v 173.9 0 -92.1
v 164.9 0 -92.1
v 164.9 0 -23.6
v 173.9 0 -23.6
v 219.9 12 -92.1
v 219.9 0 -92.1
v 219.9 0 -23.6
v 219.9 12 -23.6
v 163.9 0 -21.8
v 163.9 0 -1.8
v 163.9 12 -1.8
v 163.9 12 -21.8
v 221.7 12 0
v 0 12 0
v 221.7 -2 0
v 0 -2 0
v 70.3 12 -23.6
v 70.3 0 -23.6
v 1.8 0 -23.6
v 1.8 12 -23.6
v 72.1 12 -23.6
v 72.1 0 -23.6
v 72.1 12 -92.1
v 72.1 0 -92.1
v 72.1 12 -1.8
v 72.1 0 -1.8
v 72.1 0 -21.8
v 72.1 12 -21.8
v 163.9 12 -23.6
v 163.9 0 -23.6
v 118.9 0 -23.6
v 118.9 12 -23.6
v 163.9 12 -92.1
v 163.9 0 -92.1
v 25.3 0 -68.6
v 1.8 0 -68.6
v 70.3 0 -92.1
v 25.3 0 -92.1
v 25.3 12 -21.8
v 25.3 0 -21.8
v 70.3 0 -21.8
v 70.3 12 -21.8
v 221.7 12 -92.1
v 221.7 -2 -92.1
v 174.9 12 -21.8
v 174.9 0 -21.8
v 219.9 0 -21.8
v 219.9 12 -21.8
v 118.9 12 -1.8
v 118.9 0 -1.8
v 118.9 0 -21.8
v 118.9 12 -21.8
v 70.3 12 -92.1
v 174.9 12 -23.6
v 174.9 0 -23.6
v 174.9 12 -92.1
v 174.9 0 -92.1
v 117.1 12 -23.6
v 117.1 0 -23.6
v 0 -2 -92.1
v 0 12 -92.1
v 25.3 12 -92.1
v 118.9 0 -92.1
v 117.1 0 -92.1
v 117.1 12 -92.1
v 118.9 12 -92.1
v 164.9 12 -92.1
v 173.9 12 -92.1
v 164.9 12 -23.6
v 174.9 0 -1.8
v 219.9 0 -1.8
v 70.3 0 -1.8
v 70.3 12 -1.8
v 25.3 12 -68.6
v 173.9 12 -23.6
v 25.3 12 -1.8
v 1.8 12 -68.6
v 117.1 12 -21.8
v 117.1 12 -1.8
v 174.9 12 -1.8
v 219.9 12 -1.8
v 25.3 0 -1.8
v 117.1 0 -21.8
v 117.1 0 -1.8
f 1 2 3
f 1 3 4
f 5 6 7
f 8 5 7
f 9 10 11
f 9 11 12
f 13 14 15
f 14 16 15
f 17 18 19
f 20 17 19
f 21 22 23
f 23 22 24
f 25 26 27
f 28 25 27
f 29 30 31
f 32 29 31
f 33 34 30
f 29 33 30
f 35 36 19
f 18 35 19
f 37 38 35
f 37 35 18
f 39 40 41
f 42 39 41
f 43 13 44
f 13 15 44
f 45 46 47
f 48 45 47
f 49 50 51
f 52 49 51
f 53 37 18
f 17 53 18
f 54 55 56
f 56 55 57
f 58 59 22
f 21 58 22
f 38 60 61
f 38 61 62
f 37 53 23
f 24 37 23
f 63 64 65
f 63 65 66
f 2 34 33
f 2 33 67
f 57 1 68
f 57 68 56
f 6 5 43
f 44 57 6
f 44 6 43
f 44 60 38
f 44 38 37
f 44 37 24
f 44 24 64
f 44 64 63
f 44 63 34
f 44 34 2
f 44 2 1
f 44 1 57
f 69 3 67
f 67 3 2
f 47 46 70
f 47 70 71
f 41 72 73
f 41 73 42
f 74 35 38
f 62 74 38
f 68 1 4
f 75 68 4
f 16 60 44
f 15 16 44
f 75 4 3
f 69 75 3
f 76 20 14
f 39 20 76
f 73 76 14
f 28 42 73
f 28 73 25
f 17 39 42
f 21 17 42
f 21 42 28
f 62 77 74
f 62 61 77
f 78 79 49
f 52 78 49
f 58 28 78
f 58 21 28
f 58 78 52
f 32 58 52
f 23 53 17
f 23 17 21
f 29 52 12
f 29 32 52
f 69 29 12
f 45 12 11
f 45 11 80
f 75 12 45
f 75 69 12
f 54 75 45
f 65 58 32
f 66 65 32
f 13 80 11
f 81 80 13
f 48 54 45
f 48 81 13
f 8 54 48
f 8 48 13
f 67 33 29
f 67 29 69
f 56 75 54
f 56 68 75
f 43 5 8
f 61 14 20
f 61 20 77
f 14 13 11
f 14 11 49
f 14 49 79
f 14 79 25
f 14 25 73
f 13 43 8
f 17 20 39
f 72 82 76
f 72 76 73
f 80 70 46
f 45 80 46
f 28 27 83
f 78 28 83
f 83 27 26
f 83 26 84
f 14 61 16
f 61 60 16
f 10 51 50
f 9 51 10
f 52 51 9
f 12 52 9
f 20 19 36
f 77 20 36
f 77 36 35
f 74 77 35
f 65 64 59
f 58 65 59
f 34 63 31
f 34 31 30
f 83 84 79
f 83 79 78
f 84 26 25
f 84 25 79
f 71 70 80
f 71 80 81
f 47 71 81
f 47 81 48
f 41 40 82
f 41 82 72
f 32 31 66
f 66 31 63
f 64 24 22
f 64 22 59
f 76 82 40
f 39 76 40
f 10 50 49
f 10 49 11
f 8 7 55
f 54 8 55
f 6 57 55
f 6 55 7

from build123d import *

# Parameters (mm, degrees)
SKETCH1_W           = 221.7
SKETCH1_H           = 92.1
BOSS_EXTRUDE1_DEPTH = 2
SKETCH1_3_W         = 45
SKETCH1_3_H         = 20
BOSS_EXTRUDE2_DEPTH = 12


with BuildPart() as part:
    # Sketch1 → Boss-Extrude1 (new body)
    with BuildSketch(Plane(origin=(0, 0, 0), x_dir=(1, 0, 0), z_dir=(0, 1, 0))):
        with Locations((110.85, 46.05)):
            Rectangle(SKETCH1_W, SKETCH1_H)
    extrude(amount=-BOSS_EXTRUDE1_DEPTH)

    # Sketch1<3> → Boss-Extrude2 (add)
    with BuildSketch(Plane(origin=(0, 0, 0), x_dir=(1, 0, 0), z_dir=(0, 1, 0))):
        Polygon((0, 92.1), (0, 0), (221.7, 0), (221.7, 92.1), (219.9, 92.1), (219.9, 23.6), (174.9, 23.6), (174.9, 92.1), (173.9, 92.1), (173.9, 23.6), (164.9, 23.6), (164.9, 92.1), (163.9, 92.1), (163.9, 23.6), (118.9, 23.6), (118.9, 92.1), (117.1, 92.1), (117.1, 23.6), (72.1, 23.6), (72.1, 92.1), (70.3, 92.1), (70.3, 23.6), (1.8, 23.6), (1.8, 68.6), (25.3, 68.6), (25.3, 92.1), align=None)
        with Locations((47.8, 11.8)):
            Rectangle(SKETCH1_3_W, SKETCH1_3_H, mode=Mode.SUBTRACT)
        with Locations((94.6, 11.8)):
            Rectangle(SKETCH1_3_W, SKETCH1_3_H, mode=Mode.SUBTRACT)
        with Locations((141.4, 11.8)):
            Rectangle(SKETCH1_3_W, SKETCH1_3_H, mode=Mode.SUBTRACT)
        with Locations((197.4, 11.8)):
            Rectangle(SKETCH1_3_W, SKETCH1_3_H, mode=Mode.SUBTRACT)
    extrude(amount=BOSS_EXTRUDE2_DEPTH)


solid = part.part
